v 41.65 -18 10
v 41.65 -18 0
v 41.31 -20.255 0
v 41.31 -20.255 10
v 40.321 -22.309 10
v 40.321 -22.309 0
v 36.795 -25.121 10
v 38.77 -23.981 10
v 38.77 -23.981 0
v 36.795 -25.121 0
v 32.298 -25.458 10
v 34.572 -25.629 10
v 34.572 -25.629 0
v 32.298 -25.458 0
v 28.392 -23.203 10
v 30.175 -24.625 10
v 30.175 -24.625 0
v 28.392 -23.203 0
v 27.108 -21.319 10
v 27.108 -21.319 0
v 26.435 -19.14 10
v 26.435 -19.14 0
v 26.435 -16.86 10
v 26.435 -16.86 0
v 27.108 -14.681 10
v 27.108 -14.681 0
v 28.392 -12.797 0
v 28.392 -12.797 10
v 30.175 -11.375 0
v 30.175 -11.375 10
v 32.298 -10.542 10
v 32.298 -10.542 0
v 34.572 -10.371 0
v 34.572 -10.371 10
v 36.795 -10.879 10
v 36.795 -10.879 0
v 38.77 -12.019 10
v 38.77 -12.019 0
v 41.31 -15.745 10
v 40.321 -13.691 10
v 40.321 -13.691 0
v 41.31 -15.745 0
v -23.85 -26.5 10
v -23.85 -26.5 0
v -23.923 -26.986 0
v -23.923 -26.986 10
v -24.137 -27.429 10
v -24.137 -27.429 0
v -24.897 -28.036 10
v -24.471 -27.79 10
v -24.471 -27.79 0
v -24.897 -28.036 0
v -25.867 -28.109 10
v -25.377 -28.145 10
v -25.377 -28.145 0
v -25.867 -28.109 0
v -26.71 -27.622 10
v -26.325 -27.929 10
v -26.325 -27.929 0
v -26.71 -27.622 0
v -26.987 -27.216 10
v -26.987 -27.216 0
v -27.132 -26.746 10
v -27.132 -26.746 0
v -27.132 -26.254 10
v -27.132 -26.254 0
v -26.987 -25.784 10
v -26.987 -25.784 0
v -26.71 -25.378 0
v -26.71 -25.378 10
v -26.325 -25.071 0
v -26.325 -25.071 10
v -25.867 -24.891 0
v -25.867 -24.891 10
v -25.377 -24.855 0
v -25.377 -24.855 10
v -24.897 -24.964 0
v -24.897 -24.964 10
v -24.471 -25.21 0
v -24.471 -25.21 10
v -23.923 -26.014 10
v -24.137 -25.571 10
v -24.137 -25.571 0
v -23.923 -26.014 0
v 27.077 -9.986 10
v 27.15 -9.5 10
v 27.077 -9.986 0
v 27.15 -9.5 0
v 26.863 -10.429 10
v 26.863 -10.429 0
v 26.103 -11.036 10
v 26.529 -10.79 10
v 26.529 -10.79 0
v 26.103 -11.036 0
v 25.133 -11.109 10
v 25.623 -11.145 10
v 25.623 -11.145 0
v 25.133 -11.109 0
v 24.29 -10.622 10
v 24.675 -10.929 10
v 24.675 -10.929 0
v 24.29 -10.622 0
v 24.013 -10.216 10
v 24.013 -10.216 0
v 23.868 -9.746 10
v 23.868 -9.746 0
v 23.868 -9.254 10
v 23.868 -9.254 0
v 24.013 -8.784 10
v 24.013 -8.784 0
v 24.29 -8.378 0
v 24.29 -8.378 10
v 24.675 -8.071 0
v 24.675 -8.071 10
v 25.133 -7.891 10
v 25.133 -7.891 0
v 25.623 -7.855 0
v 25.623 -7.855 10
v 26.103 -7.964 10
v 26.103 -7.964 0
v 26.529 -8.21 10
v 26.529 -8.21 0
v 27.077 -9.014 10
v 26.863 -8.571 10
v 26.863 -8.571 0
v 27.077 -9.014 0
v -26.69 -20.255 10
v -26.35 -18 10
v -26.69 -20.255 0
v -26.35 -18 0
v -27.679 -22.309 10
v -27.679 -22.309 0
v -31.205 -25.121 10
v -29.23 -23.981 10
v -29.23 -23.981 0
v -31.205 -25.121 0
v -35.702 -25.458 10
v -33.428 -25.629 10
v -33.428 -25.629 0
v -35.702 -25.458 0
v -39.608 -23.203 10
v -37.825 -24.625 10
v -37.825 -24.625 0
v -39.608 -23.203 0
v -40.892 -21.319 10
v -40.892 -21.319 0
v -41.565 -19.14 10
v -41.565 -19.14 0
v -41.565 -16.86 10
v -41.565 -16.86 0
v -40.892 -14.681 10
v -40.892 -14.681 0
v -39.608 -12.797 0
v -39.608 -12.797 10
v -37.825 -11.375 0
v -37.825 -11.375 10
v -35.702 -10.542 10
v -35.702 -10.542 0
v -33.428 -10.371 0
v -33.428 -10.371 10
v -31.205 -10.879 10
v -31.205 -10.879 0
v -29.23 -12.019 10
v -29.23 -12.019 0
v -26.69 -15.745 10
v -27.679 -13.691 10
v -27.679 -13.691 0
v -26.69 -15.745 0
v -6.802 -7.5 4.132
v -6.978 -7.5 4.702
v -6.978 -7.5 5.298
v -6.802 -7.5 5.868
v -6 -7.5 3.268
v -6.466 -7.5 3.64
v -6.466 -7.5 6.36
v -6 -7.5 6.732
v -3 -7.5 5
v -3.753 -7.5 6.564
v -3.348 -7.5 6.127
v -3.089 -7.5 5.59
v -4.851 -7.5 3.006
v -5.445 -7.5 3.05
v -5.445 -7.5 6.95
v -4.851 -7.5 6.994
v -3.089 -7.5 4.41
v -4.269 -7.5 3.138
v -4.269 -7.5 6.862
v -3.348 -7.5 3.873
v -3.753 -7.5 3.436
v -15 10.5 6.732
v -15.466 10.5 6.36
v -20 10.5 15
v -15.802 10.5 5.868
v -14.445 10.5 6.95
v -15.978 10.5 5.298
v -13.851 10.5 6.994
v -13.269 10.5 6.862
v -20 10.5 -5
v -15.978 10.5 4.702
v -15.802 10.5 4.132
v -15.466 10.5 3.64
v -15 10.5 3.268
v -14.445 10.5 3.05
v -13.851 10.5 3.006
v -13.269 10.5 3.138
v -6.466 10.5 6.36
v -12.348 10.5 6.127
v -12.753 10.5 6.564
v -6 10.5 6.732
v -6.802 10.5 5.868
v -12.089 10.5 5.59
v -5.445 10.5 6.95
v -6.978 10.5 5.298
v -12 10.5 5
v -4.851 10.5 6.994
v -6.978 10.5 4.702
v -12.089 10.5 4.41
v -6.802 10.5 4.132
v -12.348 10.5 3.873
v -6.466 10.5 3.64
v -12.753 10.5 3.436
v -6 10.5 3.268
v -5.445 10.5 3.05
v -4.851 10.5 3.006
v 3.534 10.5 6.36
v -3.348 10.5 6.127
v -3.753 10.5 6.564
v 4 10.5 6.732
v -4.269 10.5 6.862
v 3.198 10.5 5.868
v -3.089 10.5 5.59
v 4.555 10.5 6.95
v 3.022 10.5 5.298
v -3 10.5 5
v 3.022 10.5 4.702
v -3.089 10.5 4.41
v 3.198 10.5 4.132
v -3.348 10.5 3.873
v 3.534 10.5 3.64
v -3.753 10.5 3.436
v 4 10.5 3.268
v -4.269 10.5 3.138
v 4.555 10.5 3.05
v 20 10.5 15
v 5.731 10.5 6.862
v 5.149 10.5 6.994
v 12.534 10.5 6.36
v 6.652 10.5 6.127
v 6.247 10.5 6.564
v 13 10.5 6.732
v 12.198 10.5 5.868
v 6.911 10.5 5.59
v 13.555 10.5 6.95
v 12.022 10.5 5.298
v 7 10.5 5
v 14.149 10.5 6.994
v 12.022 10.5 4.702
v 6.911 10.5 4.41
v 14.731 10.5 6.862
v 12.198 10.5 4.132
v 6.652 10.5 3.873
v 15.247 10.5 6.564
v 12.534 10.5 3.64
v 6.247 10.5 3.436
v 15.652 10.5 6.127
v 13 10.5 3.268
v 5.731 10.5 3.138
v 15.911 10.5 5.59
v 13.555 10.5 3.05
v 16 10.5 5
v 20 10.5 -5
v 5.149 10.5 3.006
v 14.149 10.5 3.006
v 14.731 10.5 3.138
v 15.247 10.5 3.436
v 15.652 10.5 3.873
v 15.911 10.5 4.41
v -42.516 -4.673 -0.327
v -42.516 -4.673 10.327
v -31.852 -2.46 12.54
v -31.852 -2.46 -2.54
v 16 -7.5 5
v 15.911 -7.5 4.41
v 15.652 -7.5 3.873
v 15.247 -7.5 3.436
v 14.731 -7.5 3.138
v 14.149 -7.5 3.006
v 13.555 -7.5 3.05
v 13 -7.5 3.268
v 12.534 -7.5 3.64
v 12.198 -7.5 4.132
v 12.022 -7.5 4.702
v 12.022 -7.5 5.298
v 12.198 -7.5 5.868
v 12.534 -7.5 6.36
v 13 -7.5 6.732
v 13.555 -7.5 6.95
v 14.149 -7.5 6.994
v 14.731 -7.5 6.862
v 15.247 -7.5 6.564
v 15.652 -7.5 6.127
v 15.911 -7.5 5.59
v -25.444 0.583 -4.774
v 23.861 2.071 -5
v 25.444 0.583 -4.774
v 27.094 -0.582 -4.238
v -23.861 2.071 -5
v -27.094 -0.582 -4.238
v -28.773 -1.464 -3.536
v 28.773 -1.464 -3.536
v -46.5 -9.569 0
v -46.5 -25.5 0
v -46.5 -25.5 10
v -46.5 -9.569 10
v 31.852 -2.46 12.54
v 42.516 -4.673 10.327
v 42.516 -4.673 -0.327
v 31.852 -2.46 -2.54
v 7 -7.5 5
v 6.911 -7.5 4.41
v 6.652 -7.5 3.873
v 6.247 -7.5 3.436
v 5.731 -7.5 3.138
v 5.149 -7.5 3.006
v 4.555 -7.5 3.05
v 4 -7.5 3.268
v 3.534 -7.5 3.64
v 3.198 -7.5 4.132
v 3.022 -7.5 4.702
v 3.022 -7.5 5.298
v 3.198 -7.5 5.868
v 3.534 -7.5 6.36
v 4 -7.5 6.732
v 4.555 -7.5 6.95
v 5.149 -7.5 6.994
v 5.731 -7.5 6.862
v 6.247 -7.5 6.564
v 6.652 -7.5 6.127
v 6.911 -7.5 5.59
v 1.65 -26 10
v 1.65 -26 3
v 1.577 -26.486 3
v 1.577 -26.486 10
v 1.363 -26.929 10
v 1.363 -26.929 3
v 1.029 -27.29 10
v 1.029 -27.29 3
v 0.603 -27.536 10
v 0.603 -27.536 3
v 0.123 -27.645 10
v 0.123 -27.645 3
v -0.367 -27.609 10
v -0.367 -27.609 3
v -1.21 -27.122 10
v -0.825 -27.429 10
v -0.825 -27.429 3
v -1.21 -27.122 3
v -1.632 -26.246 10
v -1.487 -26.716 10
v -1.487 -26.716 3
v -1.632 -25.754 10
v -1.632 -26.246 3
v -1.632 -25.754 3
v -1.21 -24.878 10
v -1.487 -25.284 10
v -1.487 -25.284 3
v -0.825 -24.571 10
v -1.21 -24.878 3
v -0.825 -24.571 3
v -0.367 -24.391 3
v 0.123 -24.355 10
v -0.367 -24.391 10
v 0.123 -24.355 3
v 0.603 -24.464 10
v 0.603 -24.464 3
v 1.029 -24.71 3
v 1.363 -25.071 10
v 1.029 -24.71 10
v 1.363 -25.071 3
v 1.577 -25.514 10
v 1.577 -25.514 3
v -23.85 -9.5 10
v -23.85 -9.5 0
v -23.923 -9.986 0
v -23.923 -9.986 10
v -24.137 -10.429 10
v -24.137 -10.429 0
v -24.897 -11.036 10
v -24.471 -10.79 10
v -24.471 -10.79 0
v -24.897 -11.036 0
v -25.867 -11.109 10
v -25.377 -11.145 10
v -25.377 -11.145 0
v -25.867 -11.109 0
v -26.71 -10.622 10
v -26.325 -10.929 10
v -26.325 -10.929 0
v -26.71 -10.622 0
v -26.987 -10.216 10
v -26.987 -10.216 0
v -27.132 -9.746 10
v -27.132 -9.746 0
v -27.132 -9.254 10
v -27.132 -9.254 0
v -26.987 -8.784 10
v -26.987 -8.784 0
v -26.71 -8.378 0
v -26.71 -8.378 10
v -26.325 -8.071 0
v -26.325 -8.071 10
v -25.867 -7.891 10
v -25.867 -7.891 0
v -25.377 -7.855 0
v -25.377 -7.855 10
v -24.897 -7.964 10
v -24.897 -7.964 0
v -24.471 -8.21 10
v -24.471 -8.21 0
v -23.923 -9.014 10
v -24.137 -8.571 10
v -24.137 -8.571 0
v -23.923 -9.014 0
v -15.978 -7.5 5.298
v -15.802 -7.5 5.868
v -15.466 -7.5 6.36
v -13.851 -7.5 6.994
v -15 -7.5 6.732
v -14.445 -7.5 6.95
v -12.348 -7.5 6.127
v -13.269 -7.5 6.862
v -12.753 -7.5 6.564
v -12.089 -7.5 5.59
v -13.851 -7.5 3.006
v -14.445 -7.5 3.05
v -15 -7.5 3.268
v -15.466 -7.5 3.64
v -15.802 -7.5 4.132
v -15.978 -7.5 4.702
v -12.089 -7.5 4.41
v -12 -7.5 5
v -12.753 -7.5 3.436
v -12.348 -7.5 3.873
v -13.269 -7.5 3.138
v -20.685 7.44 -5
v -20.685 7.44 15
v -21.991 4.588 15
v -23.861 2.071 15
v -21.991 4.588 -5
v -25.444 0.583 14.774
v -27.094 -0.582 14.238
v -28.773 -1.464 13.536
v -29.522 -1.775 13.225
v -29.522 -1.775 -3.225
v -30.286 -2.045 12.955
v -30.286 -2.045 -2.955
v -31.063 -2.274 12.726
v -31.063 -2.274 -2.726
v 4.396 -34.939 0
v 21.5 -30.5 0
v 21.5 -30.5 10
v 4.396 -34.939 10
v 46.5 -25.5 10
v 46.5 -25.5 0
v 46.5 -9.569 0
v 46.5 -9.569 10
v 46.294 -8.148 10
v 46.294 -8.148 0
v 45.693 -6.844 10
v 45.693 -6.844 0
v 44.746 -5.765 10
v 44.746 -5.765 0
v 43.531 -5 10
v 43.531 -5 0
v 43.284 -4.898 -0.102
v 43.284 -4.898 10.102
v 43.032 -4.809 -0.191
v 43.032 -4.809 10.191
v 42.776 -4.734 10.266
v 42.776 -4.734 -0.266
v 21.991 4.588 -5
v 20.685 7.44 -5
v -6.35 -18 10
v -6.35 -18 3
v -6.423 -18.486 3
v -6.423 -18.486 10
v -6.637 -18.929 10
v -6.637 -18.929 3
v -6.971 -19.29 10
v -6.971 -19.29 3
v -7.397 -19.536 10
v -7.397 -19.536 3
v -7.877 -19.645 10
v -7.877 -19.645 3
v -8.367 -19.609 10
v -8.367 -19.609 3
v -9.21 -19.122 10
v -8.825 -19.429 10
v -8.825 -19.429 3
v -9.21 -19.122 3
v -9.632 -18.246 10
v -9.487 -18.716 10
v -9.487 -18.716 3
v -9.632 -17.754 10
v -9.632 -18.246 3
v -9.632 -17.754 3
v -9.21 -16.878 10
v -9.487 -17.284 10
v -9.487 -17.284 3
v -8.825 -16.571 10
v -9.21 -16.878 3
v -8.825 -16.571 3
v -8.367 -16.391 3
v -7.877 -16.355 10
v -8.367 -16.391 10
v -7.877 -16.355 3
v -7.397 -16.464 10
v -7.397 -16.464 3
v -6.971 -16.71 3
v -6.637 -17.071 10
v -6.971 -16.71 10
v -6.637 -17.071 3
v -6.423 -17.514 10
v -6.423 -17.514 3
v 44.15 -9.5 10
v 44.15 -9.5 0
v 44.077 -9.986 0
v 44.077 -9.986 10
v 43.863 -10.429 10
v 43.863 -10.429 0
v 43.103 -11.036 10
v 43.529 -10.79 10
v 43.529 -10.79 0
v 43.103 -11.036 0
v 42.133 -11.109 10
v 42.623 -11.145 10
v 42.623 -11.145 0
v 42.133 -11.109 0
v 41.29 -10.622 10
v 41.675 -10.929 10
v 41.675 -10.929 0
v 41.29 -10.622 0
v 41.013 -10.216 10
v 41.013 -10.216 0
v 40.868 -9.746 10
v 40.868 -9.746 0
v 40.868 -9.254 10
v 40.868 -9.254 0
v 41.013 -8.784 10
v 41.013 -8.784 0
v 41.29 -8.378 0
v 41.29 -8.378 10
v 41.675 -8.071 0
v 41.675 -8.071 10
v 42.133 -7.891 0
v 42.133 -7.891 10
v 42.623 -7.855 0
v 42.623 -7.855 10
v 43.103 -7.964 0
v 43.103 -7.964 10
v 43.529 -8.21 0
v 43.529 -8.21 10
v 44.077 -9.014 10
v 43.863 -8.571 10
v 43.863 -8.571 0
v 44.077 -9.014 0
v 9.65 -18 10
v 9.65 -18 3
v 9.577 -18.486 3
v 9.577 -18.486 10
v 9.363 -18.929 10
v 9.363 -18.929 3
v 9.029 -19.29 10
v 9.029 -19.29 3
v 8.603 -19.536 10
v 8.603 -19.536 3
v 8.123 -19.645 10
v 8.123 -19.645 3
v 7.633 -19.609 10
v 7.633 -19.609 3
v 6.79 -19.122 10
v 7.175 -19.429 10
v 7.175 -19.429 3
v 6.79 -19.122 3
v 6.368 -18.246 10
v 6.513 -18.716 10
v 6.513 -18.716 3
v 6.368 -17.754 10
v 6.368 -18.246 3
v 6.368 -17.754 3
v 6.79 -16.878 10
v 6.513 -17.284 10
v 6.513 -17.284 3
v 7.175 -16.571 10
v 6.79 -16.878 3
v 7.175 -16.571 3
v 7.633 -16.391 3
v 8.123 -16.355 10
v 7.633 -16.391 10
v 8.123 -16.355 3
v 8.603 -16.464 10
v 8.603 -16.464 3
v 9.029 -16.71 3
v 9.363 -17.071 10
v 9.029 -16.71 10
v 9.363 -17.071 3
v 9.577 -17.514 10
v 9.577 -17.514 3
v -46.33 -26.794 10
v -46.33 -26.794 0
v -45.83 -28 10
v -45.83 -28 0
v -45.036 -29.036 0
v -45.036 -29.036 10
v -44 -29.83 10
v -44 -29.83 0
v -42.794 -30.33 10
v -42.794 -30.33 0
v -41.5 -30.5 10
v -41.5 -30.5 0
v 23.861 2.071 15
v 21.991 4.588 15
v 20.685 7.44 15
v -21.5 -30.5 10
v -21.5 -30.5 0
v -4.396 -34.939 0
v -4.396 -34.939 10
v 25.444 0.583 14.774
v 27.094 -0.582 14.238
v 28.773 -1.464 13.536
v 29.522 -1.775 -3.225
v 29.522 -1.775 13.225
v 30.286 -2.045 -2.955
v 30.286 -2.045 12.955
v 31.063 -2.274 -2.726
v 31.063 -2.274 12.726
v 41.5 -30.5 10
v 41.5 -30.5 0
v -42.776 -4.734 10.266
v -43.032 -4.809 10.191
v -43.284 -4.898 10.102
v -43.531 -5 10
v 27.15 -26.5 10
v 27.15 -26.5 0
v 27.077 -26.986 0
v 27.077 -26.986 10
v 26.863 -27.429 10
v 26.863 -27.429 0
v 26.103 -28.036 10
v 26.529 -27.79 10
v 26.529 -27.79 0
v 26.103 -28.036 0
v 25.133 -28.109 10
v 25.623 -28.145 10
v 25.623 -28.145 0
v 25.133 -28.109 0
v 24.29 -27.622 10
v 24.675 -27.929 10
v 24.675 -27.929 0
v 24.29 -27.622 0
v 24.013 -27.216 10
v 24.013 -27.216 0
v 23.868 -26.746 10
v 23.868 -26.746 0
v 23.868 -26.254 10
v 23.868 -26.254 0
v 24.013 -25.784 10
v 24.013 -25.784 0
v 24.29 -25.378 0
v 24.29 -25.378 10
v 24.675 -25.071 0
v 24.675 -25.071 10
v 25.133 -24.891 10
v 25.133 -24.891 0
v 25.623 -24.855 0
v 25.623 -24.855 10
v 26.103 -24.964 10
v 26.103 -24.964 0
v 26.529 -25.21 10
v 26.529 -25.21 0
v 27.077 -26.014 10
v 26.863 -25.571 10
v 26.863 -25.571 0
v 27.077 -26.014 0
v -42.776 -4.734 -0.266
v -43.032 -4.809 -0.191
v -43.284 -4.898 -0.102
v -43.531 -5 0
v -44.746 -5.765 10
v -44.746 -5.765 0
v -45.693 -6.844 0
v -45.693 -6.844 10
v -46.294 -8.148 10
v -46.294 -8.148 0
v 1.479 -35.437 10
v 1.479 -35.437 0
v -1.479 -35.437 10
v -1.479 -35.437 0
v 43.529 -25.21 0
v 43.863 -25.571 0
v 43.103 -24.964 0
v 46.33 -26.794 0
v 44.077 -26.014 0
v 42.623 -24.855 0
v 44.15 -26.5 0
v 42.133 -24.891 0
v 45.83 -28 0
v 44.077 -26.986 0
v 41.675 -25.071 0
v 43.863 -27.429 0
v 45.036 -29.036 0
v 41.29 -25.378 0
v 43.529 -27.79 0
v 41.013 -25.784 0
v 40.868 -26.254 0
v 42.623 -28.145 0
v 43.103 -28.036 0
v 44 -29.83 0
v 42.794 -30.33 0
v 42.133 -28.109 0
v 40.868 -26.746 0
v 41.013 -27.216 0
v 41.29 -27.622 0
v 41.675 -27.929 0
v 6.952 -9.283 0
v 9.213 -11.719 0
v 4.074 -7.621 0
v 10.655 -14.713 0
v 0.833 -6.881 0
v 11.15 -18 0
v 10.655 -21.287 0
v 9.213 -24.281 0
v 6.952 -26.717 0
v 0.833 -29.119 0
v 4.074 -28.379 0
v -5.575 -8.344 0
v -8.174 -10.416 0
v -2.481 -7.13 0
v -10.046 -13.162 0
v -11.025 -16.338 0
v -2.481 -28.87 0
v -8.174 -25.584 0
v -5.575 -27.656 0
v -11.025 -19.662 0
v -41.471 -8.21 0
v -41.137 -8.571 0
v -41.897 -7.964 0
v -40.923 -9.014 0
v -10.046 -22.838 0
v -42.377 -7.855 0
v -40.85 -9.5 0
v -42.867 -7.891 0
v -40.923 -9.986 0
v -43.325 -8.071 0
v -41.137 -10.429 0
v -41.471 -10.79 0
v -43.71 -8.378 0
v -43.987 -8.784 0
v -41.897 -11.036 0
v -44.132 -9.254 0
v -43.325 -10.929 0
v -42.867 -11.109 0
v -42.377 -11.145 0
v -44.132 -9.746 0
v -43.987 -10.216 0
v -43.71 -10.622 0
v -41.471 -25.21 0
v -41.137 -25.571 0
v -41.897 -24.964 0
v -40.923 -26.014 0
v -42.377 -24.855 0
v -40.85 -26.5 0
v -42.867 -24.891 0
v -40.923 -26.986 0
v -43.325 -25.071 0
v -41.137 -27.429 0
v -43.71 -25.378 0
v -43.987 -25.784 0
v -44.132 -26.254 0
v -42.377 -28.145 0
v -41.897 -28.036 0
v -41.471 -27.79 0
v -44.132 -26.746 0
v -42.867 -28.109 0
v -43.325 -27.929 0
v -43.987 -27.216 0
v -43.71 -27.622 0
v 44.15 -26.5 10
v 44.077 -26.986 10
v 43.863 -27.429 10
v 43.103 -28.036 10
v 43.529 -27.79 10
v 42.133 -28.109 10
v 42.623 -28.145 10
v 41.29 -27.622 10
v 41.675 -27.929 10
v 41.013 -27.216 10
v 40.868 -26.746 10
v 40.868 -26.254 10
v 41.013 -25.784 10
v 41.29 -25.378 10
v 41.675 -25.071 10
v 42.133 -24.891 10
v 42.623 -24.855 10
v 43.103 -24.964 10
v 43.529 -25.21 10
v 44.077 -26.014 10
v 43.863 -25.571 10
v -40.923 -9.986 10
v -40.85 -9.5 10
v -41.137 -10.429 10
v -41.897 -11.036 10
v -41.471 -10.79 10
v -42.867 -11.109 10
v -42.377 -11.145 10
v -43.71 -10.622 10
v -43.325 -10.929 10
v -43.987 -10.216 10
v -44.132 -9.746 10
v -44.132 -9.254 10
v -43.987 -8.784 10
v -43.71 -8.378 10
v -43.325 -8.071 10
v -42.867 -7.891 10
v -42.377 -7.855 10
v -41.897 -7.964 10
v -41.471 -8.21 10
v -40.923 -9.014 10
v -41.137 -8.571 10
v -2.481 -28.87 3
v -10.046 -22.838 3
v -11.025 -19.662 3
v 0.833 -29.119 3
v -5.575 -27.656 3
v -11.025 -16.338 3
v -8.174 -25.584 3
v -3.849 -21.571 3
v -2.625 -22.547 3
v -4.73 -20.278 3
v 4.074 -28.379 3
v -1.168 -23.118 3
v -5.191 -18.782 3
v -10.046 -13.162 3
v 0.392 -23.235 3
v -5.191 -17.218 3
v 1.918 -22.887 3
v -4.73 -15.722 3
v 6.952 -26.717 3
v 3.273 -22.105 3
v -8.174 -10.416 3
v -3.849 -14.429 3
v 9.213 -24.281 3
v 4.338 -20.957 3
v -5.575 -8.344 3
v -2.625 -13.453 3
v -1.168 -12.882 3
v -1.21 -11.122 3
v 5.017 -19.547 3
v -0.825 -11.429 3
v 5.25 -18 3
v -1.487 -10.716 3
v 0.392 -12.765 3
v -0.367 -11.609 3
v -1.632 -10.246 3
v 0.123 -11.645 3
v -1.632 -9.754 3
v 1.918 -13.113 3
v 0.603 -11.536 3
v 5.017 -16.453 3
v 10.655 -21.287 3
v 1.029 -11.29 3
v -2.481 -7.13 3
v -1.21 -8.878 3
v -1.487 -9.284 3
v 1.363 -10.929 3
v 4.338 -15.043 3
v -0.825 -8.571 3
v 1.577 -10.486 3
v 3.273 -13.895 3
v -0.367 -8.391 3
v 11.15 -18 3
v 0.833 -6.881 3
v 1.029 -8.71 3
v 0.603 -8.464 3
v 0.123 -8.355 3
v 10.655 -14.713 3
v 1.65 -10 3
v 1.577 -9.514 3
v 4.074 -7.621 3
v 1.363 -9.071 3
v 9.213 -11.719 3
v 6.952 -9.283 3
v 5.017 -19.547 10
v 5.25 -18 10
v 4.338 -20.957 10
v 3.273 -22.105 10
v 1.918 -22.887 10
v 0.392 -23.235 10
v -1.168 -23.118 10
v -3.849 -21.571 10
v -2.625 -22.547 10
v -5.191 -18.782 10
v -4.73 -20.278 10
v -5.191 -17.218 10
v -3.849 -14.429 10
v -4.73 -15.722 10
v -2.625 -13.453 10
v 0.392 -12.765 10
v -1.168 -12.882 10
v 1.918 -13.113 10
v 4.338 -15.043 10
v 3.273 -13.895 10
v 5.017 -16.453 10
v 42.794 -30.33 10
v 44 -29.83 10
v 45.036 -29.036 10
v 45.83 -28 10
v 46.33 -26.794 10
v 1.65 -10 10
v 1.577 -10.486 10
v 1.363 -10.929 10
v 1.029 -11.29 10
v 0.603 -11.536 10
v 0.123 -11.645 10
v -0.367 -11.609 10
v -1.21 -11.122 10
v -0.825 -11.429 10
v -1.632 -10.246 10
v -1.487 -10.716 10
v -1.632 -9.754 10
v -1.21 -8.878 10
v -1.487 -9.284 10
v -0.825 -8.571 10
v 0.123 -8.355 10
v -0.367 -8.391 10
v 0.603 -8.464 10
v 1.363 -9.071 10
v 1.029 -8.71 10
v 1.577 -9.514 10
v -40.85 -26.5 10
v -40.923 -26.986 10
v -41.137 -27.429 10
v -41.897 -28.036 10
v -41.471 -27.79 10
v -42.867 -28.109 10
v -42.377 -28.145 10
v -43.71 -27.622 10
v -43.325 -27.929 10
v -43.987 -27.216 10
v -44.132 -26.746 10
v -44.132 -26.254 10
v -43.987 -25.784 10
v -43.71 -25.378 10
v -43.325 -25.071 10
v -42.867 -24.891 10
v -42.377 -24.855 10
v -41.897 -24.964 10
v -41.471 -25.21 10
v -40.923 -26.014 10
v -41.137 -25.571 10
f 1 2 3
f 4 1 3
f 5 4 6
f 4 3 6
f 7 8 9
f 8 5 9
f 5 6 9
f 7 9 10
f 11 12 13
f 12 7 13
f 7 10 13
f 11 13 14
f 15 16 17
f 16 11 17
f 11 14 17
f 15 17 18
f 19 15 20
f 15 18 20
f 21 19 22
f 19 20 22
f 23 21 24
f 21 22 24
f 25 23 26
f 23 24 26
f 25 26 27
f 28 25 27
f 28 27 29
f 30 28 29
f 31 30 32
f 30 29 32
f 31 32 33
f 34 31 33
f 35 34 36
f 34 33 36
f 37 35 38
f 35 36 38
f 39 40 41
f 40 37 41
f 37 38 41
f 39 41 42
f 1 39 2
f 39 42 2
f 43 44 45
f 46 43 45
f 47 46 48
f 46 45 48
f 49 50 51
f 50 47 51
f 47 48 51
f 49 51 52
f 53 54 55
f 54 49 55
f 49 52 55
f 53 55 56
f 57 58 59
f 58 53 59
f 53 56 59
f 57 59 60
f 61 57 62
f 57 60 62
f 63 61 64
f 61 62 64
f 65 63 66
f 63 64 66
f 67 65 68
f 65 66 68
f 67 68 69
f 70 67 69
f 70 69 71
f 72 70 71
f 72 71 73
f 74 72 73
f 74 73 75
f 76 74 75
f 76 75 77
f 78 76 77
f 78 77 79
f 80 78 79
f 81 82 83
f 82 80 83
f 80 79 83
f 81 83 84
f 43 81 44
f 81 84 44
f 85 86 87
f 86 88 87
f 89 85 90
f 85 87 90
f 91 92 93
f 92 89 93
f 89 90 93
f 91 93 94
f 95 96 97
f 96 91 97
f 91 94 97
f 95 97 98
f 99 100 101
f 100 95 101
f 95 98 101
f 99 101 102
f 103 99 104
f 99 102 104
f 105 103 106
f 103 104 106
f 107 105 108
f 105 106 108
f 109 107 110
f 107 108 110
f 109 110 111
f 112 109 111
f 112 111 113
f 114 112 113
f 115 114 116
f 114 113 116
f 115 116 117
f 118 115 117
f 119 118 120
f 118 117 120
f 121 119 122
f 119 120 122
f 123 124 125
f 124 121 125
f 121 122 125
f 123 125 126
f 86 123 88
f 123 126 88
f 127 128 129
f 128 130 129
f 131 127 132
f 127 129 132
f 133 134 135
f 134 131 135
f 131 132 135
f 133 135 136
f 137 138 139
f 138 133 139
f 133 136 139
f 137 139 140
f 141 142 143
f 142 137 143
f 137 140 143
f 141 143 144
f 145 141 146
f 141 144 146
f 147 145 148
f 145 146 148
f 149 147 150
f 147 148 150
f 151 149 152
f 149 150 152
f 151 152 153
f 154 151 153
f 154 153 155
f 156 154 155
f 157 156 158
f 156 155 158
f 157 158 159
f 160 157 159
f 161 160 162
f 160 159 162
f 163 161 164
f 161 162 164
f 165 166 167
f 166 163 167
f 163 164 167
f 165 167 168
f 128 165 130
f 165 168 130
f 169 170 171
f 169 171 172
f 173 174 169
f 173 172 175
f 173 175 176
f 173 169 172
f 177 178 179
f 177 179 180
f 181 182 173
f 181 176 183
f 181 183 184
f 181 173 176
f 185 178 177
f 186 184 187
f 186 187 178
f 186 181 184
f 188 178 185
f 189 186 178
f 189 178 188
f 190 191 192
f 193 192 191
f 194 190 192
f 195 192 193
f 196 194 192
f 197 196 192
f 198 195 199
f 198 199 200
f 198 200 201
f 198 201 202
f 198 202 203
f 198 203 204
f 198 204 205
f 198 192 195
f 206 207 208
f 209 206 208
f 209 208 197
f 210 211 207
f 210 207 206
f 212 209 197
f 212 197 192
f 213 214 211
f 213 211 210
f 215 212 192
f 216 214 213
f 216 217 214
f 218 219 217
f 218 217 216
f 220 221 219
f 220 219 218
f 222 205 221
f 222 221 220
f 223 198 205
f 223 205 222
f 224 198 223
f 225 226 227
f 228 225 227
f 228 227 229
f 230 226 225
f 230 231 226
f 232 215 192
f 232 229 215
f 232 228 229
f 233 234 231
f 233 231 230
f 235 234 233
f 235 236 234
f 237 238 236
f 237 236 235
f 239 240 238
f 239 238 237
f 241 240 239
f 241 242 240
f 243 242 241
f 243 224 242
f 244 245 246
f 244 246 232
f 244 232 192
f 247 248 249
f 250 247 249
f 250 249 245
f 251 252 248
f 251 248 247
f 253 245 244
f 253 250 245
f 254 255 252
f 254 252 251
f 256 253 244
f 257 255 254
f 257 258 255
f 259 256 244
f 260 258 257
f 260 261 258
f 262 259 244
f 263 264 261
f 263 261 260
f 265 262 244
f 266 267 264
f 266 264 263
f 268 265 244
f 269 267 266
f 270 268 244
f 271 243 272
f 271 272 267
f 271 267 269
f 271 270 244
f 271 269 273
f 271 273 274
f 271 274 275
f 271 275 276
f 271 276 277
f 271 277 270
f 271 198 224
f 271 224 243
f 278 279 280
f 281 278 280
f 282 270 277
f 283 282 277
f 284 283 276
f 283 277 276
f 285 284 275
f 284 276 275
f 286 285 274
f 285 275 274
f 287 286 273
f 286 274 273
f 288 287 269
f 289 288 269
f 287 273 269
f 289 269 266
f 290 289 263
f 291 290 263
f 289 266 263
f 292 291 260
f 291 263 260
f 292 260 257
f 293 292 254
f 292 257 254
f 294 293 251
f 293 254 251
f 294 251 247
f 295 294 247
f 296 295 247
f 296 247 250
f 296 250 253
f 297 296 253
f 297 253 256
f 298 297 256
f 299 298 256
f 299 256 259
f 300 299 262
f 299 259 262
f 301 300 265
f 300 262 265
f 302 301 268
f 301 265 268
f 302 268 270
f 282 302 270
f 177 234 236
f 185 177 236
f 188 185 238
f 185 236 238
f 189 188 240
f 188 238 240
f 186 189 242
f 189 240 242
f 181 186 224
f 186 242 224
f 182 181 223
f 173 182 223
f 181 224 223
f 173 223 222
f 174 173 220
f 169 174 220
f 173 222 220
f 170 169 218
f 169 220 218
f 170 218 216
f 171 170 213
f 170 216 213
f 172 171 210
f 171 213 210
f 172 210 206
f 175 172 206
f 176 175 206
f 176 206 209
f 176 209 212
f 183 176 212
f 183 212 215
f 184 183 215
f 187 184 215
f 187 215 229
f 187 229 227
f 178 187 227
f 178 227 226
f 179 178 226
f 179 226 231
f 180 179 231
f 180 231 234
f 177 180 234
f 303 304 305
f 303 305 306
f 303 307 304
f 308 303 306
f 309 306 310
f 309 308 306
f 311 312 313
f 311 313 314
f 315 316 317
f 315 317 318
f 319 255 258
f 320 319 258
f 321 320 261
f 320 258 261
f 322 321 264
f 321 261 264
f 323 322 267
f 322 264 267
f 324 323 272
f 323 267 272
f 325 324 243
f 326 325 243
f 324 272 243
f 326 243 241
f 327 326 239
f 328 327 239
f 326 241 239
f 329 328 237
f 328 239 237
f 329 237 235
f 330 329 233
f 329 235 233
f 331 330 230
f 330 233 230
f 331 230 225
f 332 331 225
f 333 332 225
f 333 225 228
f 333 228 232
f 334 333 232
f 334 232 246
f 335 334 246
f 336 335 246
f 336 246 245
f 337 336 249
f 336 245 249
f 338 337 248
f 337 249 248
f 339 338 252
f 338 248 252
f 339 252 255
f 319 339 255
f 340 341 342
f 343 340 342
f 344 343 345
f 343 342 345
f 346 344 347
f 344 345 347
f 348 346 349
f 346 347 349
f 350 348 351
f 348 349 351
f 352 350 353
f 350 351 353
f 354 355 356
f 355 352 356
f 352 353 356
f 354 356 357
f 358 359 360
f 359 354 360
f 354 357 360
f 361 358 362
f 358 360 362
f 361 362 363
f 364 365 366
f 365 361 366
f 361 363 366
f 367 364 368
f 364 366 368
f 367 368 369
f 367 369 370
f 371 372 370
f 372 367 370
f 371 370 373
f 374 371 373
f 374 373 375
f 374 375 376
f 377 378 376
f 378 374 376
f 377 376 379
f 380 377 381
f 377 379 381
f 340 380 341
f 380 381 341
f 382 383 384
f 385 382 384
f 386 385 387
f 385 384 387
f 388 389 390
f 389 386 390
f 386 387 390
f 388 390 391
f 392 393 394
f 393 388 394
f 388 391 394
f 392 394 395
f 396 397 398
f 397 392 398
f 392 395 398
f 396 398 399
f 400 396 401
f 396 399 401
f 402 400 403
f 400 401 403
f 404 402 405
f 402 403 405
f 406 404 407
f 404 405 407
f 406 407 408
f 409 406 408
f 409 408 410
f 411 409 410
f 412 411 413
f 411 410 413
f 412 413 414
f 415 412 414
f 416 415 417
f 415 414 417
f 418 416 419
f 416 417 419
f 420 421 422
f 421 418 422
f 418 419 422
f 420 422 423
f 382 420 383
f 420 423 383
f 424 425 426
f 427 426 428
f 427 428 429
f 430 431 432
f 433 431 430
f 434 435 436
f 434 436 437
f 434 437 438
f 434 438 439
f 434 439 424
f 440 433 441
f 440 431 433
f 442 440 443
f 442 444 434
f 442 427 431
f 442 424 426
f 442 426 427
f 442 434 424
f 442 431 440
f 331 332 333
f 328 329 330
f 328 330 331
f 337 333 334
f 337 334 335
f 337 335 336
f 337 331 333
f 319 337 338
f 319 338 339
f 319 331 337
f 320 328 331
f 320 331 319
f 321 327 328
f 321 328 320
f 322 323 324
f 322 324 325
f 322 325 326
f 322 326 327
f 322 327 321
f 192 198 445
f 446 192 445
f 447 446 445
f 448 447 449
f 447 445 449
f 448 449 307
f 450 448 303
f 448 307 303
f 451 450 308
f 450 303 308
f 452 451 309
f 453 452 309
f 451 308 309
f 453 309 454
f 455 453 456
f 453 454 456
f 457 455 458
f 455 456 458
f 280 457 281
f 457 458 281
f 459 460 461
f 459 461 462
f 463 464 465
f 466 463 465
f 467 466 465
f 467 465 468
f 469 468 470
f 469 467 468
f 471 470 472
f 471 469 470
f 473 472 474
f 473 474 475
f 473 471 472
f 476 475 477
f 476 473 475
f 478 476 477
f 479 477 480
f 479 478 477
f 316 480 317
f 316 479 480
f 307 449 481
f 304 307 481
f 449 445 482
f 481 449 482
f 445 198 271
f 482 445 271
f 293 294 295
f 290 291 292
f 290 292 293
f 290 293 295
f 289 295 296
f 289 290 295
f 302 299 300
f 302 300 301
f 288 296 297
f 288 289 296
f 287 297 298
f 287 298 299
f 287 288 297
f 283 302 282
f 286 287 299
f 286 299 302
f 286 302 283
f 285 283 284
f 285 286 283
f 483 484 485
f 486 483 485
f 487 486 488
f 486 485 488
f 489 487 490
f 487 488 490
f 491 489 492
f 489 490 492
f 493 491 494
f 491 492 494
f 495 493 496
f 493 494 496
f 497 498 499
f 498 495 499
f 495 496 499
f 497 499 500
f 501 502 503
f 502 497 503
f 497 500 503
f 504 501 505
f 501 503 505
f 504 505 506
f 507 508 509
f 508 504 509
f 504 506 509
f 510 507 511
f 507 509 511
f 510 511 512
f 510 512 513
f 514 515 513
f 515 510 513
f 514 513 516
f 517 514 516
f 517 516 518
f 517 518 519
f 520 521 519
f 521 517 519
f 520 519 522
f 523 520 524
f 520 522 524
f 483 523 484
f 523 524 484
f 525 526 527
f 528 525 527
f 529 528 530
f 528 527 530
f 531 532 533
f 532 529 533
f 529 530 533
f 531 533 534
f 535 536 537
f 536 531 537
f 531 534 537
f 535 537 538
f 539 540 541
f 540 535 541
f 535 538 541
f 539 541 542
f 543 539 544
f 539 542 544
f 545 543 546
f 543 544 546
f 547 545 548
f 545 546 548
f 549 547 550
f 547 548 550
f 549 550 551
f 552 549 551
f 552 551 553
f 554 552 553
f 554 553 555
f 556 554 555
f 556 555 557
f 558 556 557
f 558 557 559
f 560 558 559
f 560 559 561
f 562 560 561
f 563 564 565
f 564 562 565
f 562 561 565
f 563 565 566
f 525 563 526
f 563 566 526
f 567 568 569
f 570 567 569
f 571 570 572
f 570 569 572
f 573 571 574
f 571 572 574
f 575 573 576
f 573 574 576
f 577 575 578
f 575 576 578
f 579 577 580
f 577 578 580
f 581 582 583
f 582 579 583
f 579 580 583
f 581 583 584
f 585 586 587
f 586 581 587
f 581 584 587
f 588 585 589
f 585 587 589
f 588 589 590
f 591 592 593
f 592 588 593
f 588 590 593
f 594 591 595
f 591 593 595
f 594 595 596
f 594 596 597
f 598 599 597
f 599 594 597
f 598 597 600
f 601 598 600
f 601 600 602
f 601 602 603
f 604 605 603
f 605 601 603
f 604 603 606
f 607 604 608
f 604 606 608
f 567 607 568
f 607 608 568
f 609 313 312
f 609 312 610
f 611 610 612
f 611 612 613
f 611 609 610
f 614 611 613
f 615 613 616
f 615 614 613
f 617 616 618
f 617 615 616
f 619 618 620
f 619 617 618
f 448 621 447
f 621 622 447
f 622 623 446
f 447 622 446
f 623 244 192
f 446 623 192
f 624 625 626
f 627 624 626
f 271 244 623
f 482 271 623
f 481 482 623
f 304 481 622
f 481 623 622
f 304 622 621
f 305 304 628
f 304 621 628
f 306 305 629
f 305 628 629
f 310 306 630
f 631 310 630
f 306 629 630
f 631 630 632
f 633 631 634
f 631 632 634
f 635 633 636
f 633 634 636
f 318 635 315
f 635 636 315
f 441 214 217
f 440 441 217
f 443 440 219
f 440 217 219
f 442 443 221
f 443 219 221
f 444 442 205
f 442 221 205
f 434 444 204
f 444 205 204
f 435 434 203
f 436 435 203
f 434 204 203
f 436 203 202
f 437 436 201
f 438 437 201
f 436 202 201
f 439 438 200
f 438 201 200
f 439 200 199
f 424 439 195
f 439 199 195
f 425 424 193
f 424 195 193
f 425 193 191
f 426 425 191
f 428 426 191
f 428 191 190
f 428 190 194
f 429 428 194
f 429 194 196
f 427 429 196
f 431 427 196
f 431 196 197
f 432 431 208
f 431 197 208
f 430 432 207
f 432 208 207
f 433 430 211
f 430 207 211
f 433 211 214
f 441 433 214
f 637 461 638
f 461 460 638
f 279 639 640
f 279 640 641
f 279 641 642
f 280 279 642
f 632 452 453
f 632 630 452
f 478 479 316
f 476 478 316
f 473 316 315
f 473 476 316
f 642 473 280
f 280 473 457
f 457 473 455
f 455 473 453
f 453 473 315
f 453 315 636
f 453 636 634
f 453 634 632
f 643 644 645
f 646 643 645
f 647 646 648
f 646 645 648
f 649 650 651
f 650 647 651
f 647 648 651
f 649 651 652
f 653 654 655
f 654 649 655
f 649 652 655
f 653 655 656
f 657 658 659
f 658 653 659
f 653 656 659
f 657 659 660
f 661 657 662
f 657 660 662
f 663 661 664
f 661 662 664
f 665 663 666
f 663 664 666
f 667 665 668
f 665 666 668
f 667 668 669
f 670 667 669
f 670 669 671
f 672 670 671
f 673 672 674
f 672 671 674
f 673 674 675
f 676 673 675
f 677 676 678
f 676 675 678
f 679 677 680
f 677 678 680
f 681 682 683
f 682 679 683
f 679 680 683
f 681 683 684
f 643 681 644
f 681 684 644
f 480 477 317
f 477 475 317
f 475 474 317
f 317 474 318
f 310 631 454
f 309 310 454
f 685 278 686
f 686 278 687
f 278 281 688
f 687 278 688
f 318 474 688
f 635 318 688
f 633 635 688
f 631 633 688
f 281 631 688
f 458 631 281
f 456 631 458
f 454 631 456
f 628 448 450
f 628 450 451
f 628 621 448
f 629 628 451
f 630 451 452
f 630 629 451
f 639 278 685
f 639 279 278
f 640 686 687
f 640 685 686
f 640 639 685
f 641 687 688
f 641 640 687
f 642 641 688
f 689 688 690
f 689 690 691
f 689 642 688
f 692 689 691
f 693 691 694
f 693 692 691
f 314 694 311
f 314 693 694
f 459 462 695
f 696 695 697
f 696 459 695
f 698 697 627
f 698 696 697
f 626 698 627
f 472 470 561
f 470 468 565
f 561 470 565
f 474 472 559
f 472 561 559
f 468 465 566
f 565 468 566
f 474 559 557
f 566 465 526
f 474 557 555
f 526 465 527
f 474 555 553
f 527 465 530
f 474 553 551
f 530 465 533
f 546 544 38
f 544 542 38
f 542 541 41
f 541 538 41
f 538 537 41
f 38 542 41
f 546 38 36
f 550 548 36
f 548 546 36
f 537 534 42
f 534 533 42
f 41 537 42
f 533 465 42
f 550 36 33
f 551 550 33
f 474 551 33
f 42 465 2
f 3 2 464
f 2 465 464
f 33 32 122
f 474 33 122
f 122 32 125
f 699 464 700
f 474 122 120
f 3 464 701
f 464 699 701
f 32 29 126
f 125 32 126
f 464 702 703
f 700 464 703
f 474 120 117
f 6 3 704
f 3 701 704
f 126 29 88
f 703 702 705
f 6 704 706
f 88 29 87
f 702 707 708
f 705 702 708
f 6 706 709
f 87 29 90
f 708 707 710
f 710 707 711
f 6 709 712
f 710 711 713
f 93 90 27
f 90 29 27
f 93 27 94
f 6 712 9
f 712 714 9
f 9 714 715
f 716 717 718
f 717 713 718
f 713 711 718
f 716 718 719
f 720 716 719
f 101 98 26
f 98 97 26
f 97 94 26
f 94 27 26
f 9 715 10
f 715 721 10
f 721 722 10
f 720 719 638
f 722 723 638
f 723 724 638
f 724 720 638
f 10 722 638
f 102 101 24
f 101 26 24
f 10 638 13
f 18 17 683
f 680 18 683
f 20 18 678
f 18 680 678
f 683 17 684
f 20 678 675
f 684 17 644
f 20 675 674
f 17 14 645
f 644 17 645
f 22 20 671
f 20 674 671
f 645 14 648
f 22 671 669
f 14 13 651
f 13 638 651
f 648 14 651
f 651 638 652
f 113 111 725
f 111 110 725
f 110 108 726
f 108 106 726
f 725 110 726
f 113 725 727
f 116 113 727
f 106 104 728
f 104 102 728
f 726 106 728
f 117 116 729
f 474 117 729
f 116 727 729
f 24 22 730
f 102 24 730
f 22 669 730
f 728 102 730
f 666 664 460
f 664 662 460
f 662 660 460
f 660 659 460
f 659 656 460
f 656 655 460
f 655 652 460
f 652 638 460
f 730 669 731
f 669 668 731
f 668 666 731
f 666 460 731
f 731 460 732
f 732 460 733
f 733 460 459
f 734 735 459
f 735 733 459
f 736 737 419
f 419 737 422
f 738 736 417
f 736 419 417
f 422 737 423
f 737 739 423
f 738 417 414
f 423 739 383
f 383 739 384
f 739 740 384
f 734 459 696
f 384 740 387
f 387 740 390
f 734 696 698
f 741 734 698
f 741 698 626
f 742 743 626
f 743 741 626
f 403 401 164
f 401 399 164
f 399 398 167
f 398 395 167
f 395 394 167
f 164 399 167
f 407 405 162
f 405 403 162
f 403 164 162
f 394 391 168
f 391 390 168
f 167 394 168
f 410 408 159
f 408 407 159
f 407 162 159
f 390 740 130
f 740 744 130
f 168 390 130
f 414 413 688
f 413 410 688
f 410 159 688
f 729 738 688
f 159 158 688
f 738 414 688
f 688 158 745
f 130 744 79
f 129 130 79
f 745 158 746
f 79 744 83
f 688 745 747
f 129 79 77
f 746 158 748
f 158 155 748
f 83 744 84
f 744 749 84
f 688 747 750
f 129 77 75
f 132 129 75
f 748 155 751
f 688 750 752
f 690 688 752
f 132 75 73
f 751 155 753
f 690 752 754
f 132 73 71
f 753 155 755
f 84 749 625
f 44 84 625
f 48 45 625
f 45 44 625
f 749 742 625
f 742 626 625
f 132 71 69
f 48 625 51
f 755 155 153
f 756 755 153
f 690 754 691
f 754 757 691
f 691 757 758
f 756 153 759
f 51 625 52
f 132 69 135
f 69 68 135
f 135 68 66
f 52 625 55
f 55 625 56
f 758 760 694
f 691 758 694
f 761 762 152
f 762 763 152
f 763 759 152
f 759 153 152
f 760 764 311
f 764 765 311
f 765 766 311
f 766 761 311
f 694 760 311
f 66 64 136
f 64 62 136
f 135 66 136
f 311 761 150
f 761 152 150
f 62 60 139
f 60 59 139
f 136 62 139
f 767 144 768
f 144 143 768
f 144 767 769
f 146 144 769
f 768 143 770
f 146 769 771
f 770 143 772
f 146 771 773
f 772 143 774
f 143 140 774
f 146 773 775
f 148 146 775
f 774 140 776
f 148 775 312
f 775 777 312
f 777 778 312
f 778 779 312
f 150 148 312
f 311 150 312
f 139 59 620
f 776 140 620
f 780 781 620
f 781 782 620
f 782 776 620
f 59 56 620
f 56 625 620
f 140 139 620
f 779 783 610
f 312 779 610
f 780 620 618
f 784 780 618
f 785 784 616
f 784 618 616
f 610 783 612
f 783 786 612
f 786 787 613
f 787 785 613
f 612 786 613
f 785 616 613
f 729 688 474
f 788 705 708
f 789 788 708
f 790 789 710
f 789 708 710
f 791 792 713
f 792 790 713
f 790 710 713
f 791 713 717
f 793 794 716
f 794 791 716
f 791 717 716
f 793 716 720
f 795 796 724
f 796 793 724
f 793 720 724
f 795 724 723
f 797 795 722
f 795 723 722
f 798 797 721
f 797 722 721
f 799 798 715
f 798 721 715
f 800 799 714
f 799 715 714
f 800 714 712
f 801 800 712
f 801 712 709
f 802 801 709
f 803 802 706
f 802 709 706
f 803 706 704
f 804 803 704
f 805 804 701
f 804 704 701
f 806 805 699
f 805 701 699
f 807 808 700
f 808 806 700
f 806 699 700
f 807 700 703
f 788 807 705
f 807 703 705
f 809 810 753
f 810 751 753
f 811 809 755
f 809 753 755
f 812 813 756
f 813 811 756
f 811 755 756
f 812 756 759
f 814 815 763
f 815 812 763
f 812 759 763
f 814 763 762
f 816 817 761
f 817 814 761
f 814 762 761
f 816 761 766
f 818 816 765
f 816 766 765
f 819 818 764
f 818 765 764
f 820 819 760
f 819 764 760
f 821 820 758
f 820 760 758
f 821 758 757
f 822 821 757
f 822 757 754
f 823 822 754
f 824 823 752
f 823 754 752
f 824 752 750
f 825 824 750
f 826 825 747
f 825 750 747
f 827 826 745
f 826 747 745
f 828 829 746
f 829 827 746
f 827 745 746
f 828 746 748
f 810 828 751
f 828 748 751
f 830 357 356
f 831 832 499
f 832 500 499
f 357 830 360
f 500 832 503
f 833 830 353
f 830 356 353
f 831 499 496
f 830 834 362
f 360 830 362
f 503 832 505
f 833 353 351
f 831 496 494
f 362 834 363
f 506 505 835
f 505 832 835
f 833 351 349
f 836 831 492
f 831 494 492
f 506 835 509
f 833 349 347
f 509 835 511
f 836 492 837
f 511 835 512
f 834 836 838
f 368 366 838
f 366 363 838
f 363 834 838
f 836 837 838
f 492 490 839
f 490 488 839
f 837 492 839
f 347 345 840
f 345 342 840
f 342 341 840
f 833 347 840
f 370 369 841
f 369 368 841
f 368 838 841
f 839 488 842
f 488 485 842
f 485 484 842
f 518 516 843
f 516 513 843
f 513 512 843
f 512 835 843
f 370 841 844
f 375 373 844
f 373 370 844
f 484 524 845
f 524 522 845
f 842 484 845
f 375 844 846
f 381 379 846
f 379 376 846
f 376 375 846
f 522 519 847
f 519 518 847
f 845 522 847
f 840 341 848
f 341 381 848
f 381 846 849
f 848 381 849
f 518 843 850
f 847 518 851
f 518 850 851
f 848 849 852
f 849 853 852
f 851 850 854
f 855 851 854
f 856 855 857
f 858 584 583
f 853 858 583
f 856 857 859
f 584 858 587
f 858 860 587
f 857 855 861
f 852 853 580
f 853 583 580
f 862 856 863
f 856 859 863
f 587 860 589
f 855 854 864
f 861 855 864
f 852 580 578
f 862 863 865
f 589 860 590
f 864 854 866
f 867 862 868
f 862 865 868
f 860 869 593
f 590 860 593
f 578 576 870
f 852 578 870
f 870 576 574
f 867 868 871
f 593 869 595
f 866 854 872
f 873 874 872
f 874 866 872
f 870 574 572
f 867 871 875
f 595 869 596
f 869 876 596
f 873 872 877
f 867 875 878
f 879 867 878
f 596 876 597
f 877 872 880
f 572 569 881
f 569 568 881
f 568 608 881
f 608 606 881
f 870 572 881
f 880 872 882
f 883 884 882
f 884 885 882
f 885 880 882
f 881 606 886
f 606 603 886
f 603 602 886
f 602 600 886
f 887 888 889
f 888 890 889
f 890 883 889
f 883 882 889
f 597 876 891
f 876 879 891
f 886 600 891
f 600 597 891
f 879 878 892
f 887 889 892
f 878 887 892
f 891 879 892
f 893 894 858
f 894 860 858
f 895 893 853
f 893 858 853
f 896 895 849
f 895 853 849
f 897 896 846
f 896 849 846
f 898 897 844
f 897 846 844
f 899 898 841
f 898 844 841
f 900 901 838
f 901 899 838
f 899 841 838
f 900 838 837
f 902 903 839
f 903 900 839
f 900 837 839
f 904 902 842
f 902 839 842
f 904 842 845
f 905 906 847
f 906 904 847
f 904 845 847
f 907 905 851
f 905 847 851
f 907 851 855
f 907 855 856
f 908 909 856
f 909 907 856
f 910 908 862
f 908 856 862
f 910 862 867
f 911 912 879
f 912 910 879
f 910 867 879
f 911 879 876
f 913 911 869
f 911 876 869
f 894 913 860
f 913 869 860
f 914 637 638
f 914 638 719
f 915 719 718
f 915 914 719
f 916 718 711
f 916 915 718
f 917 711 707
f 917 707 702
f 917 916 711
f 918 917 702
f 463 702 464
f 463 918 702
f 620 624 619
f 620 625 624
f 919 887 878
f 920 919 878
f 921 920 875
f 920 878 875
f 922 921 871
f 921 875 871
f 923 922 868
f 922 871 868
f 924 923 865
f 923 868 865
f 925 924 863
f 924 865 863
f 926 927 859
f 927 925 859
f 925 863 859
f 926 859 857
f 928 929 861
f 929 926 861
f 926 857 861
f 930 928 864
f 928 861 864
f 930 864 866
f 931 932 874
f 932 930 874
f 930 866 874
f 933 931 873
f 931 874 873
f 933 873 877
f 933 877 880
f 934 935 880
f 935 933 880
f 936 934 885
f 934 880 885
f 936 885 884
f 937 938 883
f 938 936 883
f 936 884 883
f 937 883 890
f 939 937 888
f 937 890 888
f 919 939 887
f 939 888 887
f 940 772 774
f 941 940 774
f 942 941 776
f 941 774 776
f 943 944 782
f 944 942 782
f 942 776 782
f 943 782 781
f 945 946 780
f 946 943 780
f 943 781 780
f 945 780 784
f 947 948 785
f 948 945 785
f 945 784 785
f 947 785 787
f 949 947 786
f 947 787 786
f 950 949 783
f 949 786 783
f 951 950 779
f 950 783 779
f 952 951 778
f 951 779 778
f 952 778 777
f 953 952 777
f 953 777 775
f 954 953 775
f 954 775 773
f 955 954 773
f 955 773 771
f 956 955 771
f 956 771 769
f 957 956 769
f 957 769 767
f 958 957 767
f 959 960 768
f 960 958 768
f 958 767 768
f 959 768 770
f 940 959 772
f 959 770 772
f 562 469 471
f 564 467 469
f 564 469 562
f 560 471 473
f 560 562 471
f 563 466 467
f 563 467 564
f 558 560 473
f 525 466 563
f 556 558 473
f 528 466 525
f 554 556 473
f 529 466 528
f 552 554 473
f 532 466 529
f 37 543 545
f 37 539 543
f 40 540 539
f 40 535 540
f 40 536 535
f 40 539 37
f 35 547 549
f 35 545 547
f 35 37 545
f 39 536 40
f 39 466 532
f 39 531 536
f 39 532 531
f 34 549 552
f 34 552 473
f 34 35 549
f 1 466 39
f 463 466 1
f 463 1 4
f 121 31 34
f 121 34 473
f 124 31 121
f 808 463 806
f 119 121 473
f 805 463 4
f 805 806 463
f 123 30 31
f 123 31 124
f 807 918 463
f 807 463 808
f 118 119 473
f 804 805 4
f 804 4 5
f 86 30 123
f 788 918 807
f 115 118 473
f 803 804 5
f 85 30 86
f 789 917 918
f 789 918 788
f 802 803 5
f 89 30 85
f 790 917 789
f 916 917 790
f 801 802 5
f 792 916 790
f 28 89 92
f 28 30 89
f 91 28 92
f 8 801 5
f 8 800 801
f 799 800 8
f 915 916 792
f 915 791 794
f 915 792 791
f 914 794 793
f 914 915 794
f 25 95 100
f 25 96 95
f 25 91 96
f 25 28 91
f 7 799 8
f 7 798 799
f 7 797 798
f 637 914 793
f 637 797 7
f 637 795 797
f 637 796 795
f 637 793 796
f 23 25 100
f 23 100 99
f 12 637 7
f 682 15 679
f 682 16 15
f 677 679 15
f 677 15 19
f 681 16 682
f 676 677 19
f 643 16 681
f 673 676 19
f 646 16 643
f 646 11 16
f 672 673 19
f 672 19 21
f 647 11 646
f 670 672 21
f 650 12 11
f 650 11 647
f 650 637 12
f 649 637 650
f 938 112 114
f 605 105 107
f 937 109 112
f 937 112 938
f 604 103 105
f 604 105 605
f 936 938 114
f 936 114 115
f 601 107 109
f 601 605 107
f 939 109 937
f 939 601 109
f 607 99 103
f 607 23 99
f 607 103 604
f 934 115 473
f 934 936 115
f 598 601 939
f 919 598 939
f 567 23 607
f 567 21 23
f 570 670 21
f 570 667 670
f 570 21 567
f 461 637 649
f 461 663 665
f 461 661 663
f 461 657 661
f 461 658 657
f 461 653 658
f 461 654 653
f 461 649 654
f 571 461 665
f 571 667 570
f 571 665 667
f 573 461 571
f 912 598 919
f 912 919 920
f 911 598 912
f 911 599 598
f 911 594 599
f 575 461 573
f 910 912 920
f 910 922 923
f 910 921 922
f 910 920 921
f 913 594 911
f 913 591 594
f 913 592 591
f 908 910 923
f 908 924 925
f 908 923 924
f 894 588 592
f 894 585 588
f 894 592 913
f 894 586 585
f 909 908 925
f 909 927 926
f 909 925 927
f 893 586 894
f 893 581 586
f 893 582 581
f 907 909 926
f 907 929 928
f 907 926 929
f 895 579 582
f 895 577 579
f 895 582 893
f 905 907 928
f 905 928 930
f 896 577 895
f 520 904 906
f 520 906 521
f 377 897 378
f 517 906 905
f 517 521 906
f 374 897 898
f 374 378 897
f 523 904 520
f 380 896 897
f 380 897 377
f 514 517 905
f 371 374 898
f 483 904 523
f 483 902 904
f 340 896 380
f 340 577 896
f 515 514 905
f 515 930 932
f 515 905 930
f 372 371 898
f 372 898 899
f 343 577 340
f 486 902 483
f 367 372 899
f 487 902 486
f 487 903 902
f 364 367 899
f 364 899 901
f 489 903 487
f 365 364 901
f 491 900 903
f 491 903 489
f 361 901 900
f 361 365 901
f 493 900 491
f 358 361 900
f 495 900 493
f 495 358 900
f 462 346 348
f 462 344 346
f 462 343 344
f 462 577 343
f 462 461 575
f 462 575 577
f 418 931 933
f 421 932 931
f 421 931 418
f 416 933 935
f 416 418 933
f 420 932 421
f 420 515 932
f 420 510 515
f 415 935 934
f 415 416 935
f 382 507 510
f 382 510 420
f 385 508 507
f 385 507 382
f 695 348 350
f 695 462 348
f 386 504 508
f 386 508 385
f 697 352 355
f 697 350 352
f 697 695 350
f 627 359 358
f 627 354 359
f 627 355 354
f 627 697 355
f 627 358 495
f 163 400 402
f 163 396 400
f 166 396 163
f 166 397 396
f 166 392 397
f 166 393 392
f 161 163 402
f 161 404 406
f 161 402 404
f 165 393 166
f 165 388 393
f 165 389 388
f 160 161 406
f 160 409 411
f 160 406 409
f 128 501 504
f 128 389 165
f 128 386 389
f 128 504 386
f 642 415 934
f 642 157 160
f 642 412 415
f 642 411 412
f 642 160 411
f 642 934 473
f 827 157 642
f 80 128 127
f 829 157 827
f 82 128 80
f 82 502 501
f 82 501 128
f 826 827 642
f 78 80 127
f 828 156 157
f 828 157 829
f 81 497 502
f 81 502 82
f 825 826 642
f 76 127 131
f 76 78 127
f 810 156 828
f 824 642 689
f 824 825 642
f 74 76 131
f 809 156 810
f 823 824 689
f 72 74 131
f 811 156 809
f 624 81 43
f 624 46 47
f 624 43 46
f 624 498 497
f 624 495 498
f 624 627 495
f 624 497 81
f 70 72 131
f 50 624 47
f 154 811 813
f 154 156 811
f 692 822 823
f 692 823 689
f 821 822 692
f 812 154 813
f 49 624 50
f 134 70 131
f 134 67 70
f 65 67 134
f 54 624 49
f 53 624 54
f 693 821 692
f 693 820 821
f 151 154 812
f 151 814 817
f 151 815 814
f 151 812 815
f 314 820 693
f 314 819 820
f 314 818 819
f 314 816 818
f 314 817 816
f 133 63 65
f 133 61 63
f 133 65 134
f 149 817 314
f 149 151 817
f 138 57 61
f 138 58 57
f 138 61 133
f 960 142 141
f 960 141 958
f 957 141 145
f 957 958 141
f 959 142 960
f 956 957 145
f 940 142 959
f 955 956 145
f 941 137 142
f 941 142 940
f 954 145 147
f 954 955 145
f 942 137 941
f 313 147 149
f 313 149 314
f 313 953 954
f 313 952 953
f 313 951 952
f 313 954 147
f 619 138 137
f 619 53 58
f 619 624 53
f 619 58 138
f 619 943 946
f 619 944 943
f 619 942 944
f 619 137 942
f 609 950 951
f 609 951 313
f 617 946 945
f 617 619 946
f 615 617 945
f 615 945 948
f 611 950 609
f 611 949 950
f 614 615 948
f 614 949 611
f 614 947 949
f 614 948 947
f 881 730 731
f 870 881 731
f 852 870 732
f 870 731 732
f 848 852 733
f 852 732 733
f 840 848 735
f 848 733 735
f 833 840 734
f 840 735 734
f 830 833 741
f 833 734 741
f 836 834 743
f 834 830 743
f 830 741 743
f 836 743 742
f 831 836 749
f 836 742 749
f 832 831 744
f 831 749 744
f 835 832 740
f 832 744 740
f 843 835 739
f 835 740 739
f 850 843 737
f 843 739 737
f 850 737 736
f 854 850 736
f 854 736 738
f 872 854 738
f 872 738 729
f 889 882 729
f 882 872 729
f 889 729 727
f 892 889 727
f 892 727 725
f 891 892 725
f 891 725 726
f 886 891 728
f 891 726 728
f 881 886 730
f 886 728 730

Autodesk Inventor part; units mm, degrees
ref_plane "YZ Plane" through (0, 0, 0) normal (1, 0, 0) x (0, 1, 0)
ref_plane "XZ Plane" through (0, 0, 0) normal (0, 1, 0) x (-1, 0, 0)
ref_plane "XY Plane" through (0, 0, 0) normal (0, 0, 1) x (1, 0, 0)
sketch "Sketch1" plane through (0, 0, 0) normal (0, 0, 1) x (1, 0, 0)
  line L0 (-20, -5) -> (20, -5)
  line L1 (20, -5) -> (20, 5)
  line L2 (20, 5) -> (-20, 5)
  line L3 (-20, 5) -> (-20, -5)
  line L4 (-20, -5) -> (20, 5) construction
  line L5 (20, -5) -> (-20, 5) construction
  circle A0 centre (0, -18) radius 11.15
  circle A1 centre (0, -18) radius 5.25
  circle A2 centre (0, -18) radius 17.5
  line L6 (-20, -5) -> (-17.2455, -20.9738)
  line L7 (20, -5) -> (17.2455, -20.9738)
  circle A3 centre (0, -10) radius 1.65
  circle A4 centre (-8, -18) radius 1.65
  circle A5 centre (0, -26) radius 1.65
  circle A6 centre (8, -18) radius 1.65
  circle A7 centre (34, -18) radius 7.65
  line L8 (21.5, -30.5) -> (46.5, -30.5)
  line L9 (46.5, -30.5) -> (46.5, -5.5)
  line L10 (46.5, -5.5) -> (21.5, -5.5)
  line L11 (21.5, -5.5) -> (21.5, -30.5)
  line L12 (21.5, -30.5) -> (46.5, -5.5) construction
  line L13 (46.5, -30.5) -> (21.5, -5.5) construction
  circle A8 centre (25.5, -9.5) radius 1.65
  circle A9 centre (42.5, -9.5) radius 1.65
  circle A10 centre (42.5, -26.5) radius 1.65
  circle A11 centre (25.5, -26.5) radius 1.65
  line L14 (46.5, -5.5) -> (20, 0)
  line L15 (21.5, -30.5) -> (4.396, -34.9389)
  line L16 (0, 5) -> (0, 15.3431)
  circle A12 centre (-34, -18) radius 7.65
  line L17 (-21.5, -30.5) -> (-46.5, -30.5)
  line L18 (-46.5, -30.5) -> (-46.5, -5.5)
  line L19 (-46.5, -5.5) -> (-21.5, -5.5)
  line L20 (-21.5, -5.5) -> (-21.5, -30.5)
  line L21 (-21.5, -30.5) -> (-46.5, -5.5) construction
  line L22 (-46.5, -30.5) -> (-21.5, -5.5) construction
  circle A13 centre (-25.5, -9.5) radius 1.65
  circle A14 centre (-42.5, -9.5) radius 1.65
  circle A15 centre (-42.5, -26.5) radius 1.65
  circle A16 centre (-25.5, -26.5) radius 1.65
  line L23 (-46.5, -5.5) -> (-20, 0)
  line L24 (-21.5, -30.5) -> (-4.396, -34.9389)
  point P0 (0, 0)
  point P1 (-4.396, -34.9389)
  dimension "d0" = 22.3
  dimension "d1" = 10.5
  dimension "d2" = 35
  dimension "d3" = 3.3
  dimension "d4" = 8
  dimension "d7" = 360
  dimension "d14" = 40
  dimension "d16" = 23
  dimension "d17" = 10
  dimension "d24" = 15.3
  dimension "d25" = 34
  dimension "d27" = 25
  dimension "d28" = 25
  dimension "d29" = 3.3
  dimension "d30" = 17
extrude "Extrusion1" add sketch "Sketch1" along normal blind 10 contours L3 L2 L1 L0 A2 | L0 A2 L6 | A2 L0 | L0 A2 | L0 L7 A2 | A0
extrude "Extrusion2" cut sketch "Sketch1" along normal blind 3 contours A0
extrude "Extrusion4" add sketch "Sketch1" along normal blind 10 contours L6 A2 L24 L20 L19 L23 L3 | L19 L20 L17 L18 | L1 L14 L10 L11 L15 A2 L7 | L11 L10 L9 L8
fillet "Fillet1" radius 5 4 edges at (-46.5, -5.5, 5) (-46.5, -30.5, 5) (46.5, -30.5, 5) (46.5, -5.5, 5)
sketch "Sketch4" plane through (-20, 5, 0) normal (0, 1, 0) x (1, 0, 0)
  line L0 (40, 0) -> (0, 0) projected
  line L1 (0, 0) -> (0, -10) projected
  line L2 (40, -10) -> (0, -10) projected
  line L3 (40, 0) -> (40, -10) projected
  point P0 (20, 0)
extrude "Extrusion5" add sketch "Sketch4" along normal blind 5.5
sketch "Sketch5" plane through (-20, 10.5, 0) normal (0, 1, 0) x (1, 0, 0)
  line L0 (40, 0) -> (0, 0) projected
  line L1 (0, 0) -> (0, -10) projected
  line L2 (0, -10) -> (40, -10) projected
  line L3 (40, -10) -> (40, 0) projected
  line L4 (40, 0) -> (0, -10)
  line L5 (0, 5) -> (40, 5)
  line L6 (40, 5) -> (40, -15)
  line L7 (40, -15) -> (0, -15)
  line L8 (0, -15) -> (0, 5)
  line L9 (0, 5) -> (40, -15) construction
  line L10 (40, 5) -> (0, -15) construction
  point P0 (20, 0)
  point P1 (20, -5)
extrude "Extrusion6" add sketch "Sketch5" against normal blind 10.5
chamfer "Chamfer1" distance 5 angle 45 2 edges at (0, 0, 10) (0, 0, 0)
sketch "Sketch7" plane through (-20, 10.5, 0) normal (0, 1, 0) x (1, 0, 0)
  line L0 (0, 5) -> (0, -15) projected
  line L1 (0, -15) -> (40, -15) projected
  line L2 (40, -15) -> (40, 5) projected
  line L3 (40, 5) -> (0, 5) projected
  line L4 (0, -5) -> (40, -5)
  line L5 (20, -5) -> (34, -5)
  line L6 (34, -5) -> (25, -5)
  circle A0 centre (34, -5) radius 2
  line L7 (34, -5) -> (25, -5)
  circle A1 centre (25, -5) radius 2
  line L8 (20, -5) -> (20, -8)
  circle A2 centre (6, -5) radius 2
  circle A3 centre (15, -5) radius 2
  point P0 (20, 0)
  dimension "d45" = 14
  dimension "d47" = 4
  dimension "d48" = 9
  dimension "d49" = 4
fillet "Fillet2" radius 15 2 edges at (-20, 0, 5) (20, 0, 5)
fillet "Fillet3" radius 5 2 edges at (0, 0, -5) (0, 0, 15)
extrude "Extrusion7" cut sketch "Sketch7" against normal blind 18 contours A2 L4 | L4 A2 | A0 L4 | L4 A0 | A3 L4 | L4 A3 | A1 L4 | L4 A1
properties part number "PARA_TUERCA" material "Steel, Mild, Welded"
